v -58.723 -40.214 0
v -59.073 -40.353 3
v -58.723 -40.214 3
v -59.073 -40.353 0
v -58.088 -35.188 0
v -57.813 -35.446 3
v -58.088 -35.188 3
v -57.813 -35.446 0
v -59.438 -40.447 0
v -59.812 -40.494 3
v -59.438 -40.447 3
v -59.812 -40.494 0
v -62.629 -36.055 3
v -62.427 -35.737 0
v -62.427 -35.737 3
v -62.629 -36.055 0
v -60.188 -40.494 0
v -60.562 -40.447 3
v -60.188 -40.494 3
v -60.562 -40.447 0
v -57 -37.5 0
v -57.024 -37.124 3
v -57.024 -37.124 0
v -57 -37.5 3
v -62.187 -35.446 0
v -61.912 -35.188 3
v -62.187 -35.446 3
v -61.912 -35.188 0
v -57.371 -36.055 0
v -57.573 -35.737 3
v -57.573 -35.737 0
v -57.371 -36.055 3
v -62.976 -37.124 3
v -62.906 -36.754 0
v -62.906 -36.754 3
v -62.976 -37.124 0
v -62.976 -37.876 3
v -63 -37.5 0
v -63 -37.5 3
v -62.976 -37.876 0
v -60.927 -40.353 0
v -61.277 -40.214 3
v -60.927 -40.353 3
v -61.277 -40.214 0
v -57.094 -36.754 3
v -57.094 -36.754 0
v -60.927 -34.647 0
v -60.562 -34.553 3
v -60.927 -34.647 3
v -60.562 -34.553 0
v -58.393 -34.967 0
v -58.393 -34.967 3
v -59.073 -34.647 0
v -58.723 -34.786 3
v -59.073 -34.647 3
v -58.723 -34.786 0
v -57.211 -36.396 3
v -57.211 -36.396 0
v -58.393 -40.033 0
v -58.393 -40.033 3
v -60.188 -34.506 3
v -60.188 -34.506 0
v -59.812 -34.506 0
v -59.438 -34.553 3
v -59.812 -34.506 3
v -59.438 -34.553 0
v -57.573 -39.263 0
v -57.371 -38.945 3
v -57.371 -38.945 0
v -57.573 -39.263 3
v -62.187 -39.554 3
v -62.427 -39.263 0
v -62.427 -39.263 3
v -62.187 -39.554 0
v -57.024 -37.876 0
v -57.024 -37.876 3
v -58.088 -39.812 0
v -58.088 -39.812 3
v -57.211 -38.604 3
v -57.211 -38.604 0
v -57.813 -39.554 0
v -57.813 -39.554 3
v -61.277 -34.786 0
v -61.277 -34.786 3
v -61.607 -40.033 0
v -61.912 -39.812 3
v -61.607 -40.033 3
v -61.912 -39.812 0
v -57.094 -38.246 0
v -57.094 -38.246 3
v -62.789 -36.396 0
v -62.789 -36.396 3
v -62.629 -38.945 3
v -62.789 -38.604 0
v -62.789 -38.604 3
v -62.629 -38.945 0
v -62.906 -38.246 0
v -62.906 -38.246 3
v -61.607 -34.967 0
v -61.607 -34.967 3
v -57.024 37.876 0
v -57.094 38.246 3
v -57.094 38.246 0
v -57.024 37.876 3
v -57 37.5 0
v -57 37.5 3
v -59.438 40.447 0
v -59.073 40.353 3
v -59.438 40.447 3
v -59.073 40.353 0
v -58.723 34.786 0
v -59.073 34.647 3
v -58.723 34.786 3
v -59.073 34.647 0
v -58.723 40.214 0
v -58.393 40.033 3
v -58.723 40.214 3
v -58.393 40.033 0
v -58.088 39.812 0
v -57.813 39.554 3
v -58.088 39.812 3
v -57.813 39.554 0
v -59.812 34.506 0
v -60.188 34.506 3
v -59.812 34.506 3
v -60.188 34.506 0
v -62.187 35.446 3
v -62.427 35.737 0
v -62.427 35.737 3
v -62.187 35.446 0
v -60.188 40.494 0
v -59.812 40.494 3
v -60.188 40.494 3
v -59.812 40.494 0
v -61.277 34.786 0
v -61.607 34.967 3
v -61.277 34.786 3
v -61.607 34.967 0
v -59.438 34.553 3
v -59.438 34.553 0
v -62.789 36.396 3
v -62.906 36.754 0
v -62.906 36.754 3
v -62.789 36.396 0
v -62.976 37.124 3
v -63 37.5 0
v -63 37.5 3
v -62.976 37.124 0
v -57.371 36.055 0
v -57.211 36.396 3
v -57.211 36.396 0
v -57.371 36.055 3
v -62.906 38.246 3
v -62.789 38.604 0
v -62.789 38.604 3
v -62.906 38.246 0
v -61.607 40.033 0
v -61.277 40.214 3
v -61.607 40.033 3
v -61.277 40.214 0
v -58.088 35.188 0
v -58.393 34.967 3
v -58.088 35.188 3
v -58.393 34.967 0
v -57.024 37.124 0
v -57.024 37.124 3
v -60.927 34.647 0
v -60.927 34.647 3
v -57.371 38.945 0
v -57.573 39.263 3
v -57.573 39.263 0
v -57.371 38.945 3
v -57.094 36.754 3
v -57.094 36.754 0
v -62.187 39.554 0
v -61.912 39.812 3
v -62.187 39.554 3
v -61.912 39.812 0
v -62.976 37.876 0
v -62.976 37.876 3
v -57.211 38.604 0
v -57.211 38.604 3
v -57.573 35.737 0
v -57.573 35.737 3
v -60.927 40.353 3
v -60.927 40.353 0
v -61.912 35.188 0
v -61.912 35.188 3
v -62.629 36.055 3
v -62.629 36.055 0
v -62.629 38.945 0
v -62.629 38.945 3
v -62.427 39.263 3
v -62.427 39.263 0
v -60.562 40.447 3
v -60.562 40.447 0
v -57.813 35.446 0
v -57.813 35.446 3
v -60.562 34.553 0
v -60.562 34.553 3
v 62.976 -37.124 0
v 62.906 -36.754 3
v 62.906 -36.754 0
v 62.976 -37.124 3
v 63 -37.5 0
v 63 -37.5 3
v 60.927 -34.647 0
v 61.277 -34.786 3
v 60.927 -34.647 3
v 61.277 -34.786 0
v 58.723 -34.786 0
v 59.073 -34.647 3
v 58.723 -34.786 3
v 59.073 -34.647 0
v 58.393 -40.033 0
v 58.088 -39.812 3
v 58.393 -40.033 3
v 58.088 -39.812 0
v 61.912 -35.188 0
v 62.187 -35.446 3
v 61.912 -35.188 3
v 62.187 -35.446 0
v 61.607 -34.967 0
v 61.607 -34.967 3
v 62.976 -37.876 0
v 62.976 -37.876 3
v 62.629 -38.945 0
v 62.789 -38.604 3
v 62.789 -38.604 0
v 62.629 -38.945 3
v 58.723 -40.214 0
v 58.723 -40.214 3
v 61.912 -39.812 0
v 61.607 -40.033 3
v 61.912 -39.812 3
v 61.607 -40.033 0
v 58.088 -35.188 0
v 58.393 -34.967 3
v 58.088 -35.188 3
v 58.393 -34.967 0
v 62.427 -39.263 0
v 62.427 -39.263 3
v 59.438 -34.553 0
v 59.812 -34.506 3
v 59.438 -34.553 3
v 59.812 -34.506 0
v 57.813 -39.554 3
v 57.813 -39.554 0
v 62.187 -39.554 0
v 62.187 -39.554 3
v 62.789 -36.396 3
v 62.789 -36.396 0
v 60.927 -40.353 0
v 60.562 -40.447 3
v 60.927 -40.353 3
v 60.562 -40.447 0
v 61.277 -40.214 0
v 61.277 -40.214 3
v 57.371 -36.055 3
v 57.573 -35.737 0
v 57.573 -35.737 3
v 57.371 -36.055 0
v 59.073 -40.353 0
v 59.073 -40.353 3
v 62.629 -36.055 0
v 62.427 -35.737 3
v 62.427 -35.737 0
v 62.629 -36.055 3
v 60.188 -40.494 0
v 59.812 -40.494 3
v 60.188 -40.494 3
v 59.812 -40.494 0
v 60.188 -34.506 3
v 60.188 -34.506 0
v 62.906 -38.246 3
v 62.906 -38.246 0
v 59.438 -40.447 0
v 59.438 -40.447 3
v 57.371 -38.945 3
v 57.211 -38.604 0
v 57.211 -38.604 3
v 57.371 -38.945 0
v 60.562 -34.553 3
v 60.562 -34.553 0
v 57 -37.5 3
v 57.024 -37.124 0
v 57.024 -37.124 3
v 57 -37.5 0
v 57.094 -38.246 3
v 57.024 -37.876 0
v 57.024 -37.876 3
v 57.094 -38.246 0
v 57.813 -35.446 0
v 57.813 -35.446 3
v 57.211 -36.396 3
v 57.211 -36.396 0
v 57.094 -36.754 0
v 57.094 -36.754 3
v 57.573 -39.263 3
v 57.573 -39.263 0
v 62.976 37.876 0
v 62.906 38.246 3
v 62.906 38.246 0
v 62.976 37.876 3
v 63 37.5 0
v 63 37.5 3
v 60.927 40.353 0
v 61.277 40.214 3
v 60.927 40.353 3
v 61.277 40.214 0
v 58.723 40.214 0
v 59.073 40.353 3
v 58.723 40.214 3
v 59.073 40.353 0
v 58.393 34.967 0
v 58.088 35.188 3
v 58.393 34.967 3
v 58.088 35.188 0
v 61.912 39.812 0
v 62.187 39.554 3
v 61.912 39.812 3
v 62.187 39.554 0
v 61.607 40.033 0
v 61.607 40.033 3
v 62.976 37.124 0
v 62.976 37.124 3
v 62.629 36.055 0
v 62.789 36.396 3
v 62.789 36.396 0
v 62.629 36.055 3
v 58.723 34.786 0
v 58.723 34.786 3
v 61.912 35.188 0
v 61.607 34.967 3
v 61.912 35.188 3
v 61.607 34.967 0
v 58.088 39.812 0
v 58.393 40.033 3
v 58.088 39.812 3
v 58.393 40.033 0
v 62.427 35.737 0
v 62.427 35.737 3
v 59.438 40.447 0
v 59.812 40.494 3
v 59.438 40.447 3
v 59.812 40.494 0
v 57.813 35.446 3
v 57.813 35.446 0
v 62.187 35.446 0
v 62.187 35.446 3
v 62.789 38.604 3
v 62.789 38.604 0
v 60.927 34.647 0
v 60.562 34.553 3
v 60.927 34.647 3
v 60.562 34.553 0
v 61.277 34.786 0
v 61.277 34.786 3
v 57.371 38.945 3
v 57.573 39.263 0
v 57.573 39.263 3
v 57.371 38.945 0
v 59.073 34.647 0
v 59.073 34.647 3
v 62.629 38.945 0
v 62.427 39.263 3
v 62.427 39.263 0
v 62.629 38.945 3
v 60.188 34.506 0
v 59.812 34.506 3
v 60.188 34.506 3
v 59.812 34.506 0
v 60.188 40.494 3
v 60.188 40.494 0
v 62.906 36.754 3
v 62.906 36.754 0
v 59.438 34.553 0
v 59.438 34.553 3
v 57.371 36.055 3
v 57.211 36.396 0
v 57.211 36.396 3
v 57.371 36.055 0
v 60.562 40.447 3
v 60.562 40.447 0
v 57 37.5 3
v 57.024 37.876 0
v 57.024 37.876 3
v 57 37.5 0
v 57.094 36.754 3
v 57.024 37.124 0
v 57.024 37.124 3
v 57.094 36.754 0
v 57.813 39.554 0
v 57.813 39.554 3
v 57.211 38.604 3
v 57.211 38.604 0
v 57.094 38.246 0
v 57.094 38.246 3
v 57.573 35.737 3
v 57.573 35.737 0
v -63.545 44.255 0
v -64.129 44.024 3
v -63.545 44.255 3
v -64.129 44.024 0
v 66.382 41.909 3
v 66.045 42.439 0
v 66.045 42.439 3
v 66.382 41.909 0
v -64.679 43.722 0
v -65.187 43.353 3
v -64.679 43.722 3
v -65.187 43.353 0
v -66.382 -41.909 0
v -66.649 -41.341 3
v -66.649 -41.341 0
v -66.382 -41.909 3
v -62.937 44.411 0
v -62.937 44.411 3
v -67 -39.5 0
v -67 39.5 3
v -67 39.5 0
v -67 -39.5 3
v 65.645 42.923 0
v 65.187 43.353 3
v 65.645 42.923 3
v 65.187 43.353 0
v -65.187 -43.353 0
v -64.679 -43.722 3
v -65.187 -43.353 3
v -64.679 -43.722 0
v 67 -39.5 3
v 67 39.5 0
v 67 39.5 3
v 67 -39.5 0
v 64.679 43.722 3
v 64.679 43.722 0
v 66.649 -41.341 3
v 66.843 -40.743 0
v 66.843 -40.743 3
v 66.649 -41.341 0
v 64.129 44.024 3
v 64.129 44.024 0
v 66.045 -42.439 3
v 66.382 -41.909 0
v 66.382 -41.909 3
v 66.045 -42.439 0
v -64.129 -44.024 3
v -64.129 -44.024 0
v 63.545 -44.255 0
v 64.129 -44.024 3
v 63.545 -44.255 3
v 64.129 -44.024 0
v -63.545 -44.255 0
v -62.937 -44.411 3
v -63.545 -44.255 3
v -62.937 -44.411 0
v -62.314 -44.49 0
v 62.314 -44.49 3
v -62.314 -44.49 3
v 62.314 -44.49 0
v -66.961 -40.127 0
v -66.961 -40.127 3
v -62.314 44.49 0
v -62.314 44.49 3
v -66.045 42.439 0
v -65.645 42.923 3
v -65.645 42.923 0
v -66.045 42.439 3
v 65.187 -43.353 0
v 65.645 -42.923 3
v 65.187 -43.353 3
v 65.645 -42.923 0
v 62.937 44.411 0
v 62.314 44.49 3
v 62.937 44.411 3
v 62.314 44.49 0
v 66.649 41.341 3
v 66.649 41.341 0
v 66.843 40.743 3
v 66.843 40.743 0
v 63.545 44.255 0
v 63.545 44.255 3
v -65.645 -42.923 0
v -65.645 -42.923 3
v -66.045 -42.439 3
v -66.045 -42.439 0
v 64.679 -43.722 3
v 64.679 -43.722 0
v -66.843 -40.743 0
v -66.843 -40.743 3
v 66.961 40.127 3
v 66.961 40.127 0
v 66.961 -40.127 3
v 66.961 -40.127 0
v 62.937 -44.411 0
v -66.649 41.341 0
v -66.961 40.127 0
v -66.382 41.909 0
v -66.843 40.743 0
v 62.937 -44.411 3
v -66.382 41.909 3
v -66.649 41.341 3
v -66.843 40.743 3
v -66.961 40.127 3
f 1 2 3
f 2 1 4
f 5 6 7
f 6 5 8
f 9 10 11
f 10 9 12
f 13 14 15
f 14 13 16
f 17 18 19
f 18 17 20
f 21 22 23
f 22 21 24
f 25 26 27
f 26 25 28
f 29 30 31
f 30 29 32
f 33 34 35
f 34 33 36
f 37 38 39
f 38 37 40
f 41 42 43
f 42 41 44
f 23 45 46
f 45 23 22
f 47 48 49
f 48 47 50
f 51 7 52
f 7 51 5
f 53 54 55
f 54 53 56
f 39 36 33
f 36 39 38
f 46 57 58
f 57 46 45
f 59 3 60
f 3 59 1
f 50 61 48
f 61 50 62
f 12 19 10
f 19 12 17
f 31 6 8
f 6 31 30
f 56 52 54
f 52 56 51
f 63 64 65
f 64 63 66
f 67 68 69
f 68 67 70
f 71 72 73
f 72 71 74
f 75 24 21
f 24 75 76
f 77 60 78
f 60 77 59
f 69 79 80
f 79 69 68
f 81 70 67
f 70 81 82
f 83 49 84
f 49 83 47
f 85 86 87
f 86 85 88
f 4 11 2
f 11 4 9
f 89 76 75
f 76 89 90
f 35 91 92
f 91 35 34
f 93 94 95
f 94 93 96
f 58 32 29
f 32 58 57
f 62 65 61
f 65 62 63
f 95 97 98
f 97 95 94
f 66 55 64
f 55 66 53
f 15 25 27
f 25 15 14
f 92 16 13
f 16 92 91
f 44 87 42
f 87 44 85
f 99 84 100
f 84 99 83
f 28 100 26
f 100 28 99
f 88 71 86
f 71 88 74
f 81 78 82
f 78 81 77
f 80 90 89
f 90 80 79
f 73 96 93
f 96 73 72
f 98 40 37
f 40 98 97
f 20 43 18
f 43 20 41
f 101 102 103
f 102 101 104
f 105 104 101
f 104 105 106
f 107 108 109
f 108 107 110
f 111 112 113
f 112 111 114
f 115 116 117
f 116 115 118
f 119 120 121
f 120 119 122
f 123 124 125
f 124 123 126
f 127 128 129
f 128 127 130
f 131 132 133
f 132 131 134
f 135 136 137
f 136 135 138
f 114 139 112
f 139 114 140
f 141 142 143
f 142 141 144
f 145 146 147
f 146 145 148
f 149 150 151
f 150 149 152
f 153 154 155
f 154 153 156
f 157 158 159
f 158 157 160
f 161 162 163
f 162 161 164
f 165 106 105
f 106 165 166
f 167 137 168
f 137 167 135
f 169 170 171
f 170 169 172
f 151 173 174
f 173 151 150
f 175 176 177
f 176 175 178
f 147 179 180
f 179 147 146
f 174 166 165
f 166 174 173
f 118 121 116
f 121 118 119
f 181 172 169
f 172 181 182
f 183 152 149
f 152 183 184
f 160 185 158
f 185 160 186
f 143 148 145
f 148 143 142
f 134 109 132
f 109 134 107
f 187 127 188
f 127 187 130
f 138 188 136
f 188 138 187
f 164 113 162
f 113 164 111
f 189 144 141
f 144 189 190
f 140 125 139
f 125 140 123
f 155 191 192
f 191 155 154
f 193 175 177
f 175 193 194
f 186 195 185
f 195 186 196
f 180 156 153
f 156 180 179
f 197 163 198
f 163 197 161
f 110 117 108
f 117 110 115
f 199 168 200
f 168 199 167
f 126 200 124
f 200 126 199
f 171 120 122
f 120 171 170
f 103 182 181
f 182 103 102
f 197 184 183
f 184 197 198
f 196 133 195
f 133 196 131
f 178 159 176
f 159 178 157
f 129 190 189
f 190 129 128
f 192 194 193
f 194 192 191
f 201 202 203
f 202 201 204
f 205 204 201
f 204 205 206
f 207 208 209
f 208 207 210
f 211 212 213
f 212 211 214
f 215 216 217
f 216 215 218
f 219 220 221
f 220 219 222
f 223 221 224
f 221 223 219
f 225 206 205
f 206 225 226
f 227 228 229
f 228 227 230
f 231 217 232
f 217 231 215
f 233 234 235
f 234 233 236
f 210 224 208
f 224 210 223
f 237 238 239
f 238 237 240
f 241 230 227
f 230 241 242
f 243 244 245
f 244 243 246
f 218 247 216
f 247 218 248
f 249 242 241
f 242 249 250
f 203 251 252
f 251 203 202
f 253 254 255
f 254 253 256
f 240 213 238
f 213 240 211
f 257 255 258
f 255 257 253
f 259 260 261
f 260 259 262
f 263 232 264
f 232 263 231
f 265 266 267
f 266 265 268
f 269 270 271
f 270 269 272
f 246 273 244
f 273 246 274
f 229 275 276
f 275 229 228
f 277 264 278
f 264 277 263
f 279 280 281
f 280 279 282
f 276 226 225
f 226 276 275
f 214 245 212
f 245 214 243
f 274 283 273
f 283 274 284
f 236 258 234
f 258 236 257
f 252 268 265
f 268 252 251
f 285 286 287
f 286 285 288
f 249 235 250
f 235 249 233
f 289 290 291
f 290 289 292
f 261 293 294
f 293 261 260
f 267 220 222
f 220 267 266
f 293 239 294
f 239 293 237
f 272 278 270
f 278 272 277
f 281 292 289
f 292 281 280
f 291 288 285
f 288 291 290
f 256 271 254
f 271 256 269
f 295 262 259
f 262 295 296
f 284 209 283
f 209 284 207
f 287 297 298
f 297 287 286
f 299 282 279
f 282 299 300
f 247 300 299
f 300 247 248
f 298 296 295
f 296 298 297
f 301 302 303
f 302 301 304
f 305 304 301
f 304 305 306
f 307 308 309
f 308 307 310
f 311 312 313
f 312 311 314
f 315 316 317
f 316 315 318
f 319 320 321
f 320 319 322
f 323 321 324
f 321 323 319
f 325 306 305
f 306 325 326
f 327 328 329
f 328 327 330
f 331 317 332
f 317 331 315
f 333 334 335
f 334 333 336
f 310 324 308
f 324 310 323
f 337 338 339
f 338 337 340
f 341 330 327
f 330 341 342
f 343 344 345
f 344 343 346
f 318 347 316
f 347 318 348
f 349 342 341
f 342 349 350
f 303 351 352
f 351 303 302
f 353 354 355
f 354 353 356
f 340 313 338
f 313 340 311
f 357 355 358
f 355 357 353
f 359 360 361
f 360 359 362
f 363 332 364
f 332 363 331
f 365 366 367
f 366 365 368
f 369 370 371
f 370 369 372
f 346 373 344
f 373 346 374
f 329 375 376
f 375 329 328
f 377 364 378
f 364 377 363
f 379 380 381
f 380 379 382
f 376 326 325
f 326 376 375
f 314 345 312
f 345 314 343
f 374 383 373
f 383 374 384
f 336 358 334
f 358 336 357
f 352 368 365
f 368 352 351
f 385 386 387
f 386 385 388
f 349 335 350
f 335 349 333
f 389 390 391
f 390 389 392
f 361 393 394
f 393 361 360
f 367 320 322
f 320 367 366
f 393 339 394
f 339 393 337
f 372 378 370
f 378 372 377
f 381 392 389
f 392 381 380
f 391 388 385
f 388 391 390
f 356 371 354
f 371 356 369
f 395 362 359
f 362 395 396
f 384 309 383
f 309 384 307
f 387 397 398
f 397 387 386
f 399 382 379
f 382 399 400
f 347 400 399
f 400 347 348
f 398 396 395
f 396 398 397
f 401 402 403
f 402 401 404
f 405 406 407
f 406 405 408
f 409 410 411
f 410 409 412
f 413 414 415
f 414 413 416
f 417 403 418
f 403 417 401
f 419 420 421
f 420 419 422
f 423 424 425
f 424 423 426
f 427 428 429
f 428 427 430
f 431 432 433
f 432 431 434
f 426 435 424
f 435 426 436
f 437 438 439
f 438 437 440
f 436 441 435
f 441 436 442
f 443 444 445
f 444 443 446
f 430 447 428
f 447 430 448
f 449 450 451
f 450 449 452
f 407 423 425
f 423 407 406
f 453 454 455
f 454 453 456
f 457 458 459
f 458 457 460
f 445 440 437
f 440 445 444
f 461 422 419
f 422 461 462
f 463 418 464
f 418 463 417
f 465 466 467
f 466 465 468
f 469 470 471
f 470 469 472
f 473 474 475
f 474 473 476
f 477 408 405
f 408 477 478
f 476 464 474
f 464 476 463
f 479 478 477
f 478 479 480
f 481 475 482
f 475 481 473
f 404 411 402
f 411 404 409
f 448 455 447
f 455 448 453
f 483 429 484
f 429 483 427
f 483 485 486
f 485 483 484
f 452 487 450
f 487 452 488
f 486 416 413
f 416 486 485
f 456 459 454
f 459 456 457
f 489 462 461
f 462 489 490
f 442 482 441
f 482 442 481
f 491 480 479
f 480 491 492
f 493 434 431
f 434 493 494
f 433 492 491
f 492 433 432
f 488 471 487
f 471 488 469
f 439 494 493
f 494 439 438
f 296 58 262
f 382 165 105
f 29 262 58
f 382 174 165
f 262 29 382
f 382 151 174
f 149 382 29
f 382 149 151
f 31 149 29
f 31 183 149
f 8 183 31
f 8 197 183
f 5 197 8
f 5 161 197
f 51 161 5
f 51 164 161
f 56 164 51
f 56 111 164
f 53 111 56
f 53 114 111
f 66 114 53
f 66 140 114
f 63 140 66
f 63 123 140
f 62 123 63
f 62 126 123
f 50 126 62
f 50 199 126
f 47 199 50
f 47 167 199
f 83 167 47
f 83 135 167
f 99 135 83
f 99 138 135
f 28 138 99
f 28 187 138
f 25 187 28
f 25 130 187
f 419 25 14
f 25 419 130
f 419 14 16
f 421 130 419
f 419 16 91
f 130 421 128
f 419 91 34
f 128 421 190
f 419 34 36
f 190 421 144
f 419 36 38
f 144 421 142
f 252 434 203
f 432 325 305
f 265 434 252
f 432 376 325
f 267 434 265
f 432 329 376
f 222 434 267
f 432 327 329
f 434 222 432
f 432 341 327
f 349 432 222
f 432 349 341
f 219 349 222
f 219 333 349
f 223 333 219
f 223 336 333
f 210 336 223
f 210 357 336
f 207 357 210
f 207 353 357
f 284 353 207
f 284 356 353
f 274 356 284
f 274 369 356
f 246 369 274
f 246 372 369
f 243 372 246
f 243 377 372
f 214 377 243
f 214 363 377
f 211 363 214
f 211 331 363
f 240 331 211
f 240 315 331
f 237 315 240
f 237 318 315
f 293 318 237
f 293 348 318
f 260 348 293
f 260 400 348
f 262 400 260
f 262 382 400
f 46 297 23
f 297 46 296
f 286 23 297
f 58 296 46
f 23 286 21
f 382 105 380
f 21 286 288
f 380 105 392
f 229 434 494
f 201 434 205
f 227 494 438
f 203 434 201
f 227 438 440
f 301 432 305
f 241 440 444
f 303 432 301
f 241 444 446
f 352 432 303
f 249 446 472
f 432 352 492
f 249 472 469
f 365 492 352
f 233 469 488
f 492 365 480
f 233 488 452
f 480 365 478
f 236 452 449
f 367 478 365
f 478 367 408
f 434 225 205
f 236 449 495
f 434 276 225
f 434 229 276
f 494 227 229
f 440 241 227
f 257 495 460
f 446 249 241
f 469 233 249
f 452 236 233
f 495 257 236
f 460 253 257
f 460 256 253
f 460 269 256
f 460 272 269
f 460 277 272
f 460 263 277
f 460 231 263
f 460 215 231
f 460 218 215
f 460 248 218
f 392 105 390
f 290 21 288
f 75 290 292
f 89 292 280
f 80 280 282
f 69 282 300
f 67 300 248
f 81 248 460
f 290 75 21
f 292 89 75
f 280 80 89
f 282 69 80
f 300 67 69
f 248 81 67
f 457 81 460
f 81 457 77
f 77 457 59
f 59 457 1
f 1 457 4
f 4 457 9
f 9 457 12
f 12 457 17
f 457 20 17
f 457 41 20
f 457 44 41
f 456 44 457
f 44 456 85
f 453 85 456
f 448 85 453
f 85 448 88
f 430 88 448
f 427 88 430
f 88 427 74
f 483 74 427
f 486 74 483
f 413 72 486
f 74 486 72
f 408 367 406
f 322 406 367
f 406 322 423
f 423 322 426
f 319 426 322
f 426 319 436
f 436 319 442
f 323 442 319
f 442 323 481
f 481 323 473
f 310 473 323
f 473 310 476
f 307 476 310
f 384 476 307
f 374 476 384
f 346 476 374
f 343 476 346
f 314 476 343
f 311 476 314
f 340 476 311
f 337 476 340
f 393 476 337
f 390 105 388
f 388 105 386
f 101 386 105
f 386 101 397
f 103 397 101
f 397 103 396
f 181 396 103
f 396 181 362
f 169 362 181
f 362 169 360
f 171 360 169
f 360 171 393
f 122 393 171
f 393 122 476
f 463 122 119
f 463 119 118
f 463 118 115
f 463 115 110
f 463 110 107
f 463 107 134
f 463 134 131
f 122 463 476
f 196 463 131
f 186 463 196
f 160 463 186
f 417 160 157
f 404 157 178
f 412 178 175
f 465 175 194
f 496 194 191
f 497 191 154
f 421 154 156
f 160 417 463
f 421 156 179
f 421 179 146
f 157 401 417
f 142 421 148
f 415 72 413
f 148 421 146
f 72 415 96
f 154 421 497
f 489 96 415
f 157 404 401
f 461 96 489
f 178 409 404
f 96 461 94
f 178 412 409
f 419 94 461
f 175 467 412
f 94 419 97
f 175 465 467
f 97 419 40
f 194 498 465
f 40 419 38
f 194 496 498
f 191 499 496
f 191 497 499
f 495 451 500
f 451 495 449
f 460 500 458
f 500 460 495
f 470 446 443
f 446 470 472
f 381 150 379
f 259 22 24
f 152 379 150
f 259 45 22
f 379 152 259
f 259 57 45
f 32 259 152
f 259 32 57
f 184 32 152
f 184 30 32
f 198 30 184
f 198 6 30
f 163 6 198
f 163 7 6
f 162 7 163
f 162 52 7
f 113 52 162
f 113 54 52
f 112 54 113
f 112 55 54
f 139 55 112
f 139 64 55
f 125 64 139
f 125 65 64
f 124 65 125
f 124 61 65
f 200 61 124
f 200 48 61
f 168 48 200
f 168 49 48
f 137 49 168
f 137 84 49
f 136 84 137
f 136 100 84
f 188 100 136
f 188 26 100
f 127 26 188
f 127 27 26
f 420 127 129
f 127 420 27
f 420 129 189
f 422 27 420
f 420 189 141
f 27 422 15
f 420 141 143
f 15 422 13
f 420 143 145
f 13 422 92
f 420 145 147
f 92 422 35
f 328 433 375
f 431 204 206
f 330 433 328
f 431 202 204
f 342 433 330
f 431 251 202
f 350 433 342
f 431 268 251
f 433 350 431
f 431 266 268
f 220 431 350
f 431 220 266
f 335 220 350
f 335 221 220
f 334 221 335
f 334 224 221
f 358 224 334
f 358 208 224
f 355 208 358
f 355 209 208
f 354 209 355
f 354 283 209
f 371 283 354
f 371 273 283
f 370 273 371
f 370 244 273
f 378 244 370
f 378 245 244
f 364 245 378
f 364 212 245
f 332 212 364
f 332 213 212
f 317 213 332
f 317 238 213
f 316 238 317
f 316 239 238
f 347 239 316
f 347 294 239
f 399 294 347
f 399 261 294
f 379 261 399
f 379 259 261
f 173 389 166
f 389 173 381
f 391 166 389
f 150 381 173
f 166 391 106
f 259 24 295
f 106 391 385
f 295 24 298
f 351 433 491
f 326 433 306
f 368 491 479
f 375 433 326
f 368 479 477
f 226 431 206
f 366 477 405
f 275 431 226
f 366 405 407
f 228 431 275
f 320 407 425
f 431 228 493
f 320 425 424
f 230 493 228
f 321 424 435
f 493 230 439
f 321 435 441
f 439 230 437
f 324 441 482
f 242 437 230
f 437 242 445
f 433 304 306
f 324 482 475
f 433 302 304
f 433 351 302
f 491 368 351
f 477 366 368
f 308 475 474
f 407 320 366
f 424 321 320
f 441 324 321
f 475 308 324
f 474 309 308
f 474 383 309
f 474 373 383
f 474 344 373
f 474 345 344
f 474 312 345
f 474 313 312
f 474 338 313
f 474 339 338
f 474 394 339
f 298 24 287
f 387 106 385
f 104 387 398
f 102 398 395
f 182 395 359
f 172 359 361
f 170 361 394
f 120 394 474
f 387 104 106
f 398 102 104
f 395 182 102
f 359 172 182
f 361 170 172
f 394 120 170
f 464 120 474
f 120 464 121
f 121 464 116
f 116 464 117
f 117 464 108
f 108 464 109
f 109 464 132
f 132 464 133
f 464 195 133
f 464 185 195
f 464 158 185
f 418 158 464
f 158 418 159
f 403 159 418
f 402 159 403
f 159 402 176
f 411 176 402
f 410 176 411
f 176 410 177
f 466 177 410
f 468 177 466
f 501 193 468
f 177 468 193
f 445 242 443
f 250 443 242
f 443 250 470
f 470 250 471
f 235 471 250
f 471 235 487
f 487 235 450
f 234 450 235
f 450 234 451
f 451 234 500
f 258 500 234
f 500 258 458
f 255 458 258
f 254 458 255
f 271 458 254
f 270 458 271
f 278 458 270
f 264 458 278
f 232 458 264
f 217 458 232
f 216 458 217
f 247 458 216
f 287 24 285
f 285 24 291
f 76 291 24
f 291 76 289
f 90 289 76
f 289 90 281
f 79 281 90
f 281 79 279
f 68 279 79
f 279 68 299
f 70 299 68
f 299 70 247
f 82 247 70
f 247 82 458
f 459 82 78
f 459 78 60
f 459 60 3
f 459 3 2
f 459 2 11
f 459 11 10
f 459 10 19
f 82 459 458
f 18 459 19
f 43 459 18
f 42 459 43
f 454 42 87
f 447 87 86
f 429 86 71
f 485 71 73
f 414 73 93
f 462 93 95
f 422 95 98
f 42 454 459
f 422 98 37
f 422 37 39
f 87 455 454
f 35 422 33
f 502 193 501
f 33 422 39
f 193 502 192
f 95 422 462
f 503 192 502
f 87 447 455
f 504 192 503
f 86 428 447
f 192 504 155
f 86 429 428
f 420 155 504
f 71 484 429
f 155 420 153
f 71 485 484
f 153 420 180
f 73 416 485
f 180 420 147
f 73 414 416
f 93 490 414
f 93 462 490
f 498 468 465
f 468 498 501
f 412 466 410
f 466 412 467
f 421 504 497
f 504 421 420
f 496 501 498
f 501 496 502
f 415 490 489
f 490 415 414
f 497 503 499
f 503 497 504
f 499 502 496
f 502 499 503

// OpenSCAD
$fn = 50;


difference() {
	union() {
		hull() {
			translate(v = [-62.0000000000, 39.5000000000, 0]) {
				cylinder(h = 3, r = 5);
			}
			translate(v = [62.0000000000, 39.5000000000, 0]) {
				cylinder(h = 3, r = 5);
			}
			translate(v = [-62.0000000000, -39.5000000000, 0]) {
				cylinder(h = 3, r = 5);
			}
			translate(v = [62.0000000000, -39.5000000000, 0]) {
				cylinder(h = 3, r = 5);
			}
		}
	}
	union() {
		translate(v = [-60.0000000000, -37.5000000000, -100.0000000000]) {
			cylinder(h = 200, r = 3.0000000000);
		}
		translate(v = [-60.0000000000, 37.5000000000, -100.0000000000]) {
			cylinder(h = 200, r = 3.0000000000);
		}
		translate(v = [60.0000000000, -37.5000000000, -100.0000000000]) {
			cylinder(h = 200, r = 3.0000000000);
		}
		translate(v = [60.0000000000, 37.5000000000, -100.0000000000]) {
			cylinder(h = 200, r = 3.0000000000);
		}
	}
}
